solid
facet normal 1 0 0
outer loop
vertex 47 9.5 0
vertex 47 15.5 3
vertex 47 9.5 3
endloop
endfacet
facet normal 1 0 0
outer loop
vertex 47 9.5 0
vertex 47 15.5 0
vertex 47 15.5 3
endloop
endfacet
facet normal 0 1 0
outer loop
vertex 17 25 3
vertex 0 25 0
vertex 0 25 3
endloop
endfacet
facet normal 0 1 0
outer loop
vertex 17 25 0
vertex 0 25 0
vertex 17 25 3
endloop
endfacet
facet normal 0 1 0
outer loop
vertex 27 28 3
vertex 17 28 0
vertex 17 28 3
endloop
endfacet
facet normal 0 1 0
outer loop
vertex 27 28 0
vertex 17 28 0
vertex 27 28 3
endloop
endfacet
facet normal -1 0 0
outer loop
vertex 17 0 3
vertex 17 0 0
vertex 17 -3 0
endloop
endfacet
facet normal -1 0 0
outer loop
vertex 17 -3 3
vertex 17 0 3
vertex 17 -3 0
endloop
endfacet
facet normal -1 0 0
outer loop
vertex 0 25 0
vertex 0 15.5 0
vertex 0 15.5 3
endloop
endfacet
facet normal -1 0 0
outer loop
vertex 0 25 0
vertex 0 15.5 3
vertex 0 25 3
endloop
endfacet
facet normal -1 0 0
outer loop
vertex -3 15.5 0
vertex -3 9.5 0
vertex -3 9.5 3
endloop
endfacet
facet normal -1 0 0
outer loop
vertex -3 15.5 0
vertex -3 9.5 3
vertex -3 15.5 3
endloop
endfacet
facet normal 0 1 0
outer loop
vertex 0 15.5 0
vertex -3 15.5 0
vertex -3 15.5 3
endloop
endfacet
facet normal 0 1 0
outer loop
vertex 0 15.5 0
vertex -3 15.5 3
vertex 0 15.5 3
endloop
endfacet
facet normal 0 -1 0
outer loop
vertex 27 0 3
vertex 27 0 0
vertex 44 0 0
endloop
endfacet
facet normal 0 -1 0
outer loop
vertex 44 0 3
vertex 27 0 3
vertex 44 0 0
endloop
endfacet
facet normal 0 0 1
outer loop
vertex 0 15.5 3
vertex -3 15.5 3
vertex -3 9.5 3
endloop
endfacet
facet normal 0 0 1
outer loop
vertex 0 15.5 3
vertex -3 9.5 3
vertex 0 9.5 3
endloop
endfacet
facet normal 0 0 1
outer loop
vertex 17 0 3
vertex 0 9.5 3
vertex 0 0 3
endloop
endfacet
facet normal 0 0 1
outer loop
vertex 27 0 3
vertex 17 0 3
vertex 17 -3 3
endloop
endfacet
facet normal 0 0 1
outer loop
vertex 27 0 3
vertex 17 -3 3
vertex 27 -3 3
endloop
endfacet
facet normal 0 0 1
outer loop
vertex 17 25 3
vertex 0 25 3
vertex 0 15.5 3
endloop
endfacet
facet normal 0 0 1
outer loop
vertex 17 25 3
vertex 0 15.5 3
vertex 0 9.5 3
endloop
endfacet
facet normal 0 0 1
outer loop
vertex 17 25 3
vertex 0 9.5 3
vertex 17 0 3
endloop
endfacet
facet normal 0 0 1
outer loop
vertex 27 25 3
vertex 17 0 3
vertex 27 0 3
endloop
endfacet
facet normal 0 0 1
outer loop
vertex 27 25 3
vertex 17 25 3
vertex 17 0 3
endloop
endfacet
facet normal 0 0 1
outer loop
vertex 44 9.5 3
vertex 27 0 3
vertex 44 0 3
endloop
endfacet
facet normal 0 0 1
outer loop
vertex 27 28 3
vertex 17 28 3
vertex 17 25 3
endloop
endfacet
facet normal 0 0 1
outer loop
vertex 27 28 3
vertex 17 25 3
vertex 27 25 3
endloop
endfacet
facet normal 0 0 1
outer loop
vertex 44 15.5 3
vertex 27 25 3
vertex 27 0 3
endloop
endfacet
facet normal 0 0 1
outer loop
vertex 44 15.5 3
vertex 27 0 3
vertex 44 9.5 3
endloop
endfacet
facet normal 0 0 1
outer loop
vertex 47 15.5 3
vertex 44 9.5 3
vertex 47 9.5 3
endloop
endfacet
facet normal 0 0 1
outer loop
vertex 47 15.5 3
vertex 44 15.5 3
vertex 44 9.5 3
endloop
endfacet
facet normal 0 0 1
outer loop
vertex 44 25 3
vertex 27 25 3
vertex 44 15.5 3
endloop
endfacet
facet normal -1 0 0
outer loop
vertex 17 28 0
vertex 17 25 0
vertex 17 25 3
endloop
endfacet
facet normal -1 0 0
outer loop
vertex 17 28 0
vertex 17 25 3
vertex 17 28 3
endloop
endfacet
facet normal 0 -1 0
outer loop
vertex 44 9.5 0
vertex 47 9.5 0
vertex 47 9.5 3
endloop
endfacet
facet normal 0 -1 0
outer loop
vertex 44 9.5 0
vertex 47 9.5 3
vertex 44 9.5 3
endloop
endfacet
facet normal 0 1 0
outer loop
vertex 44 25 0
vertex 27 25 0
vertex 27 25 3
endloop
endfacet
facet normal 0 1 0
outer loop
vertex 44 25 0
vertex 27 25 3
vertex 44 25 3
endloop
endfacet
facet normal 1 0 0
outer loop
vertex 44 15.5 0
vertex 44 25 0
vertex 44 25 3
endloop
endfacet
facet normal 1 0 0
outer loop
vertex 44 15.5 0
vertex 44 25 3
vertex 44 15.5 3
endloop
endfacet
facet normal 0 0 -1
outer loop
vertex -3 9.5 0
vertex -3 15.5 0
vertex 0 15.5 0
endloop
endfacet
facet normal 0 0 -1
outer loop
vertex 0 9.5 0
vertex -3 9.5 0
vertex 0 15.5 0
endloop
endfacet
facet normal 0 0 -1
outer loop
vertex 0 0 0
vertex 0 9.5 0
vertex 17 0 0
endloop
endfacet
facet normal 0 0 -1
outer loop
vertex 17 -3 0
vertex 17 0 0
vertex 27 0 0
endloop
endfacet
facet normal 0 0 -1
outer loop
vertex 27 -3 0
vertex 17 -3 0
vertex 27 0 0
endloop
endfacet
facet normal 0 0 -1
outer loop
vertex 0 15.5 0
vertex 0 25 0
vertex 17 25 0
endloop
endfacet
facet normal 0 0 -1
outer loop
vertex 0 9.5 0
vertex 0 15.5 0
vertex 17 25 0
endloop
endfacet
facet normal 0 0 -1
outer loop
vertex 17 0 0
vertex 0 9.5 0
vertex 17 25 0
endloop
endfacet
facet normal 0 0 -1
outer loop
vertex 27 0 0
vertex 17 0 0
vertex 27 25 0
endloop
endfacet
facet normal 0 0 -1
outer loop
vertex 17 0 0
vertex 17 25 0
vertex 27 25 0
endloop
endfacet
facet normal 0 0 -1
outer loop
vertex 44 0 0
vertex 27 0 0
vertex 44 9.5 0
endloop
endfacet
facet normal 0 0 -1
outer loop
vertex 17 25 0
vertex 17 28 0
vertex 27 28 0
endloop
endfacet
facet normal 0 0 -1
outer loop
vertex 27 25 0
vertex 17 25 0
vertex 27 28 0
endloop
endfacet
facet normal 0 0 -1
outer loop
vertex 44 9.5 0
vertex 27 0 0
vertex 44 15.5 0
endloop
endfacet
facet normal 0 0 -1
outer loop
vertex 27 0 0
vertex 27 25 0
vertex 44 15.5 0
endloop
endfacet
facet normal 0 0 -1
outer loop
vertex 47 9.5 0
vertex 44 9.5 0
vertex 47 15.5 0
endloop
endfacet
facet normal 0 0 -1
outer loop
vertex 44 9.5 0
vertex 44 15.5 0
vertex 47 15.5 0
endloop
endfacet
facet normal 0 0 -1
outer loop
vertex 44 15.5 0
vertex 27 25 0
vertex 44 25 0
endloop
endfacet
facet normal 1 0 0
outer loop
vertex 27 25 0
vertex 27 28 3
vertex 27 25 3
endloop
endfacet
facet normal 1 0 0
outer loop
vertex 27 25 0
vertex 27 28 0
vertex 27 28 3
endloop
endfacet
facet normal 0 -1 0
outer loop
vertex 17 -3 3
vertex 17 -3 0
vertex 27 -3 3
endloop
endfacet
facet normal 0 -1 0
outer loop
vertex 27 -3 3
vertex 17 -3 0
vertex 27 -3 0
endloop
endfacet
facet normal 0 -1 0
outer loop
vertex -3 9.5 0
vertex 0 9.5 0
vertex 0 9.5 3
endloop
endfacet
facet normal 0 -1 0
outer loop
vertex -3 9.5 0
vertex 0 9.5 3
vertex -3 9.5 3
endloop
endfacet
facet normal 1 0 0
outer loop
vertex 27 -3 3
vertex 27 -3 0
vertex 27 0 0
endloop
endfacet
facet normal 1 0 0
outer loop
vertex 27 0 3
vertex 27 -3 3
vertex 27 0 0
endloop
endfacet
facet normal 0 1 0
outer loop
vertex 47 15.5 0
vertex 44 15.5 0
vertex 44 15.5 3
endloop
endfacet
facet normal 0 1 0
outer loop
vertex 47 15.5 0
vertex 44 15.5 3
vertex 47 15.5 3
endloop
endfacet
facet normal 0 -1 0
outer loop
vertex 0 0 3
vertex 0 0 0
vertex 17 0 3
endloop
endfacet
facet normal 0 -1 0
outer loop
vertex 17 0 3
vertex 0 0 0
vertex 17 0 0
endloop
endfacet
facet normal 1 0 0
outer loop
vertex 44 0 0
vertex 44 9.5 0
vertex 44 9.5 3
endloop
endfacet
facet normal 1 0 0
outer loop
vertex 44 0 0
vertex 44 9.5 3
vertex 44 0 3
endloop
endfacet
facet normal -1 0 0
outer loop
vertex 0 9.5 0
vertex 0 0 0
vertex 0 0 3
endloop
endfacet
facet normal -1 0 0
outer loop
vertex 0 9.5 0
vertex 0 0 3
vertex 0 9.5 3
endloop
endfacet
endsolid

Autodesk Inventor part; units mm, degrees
ref_plane "YZ Plane" through (0, 0, 0) normal (1, 0, 0) x (0, 1, 0)
ref_plane "XZ Plane" through (0, 0, 0) normal (0, 1, 0) x (-1, 0, 0)
ref_plane "XY Plane" through (0, 0, 0) normal (0, 0, 1) x (1, 0, 0)
sketch "Sketch1" plane through (0, 0, 0) normal (0, 0, 1) x (1, 0, 0)
  line L0 (0, 9.5) -> (-3, 9.5)
  line L1 (-3, 9.5) -> (-3, 15.5)
  line L2 (-3, 15.5) -> (0, 15.5)
  line L3 (0, 15.5) -> (0, 25)
  line L4 (44, 25) -> (44, 15.5)
  line L5 (44, 15.5) -> (47, 15.5)
  line L6 (47, 15.5) -> (47, 9.5)
  line L7 (47, 9.5) -> (44, 9.5)
  line L8 (44, 9.5) -> (44, 0)
  line L9 (0, 0) -> (0, 9.5)
  line L10 (0, 25) -> (17, 25)
  line L11 (17, 25) -> (17, 28)
  line L12 (17, 28) -> (27, 28)
  line L13 (27, 28) -> (27, 25)
  line L14 (27, 25) -> (44, 25)
  line L15 (0, 0) -> (17, 0)
  line L16 (17, 0) -> (17, -3)
  line L17 (17, -3) -> (27, -3)
  line L18 (27, -3) -> (27, 0)
  line L19 (27, 0) -> (44, 0)
  dimension "d0" = 6
  dimension "d1" = 3
  dimension "d2" = 3
  dimension "d3" = 6
  dimension "d4" = 50
  dimension "d5" = 3
  dimension "d6" = 10
  dimension "d7" = 3
  dimension "d14" = 25
extrude "Extrusion1" add sketch "Sketch1" along normal blind 3
